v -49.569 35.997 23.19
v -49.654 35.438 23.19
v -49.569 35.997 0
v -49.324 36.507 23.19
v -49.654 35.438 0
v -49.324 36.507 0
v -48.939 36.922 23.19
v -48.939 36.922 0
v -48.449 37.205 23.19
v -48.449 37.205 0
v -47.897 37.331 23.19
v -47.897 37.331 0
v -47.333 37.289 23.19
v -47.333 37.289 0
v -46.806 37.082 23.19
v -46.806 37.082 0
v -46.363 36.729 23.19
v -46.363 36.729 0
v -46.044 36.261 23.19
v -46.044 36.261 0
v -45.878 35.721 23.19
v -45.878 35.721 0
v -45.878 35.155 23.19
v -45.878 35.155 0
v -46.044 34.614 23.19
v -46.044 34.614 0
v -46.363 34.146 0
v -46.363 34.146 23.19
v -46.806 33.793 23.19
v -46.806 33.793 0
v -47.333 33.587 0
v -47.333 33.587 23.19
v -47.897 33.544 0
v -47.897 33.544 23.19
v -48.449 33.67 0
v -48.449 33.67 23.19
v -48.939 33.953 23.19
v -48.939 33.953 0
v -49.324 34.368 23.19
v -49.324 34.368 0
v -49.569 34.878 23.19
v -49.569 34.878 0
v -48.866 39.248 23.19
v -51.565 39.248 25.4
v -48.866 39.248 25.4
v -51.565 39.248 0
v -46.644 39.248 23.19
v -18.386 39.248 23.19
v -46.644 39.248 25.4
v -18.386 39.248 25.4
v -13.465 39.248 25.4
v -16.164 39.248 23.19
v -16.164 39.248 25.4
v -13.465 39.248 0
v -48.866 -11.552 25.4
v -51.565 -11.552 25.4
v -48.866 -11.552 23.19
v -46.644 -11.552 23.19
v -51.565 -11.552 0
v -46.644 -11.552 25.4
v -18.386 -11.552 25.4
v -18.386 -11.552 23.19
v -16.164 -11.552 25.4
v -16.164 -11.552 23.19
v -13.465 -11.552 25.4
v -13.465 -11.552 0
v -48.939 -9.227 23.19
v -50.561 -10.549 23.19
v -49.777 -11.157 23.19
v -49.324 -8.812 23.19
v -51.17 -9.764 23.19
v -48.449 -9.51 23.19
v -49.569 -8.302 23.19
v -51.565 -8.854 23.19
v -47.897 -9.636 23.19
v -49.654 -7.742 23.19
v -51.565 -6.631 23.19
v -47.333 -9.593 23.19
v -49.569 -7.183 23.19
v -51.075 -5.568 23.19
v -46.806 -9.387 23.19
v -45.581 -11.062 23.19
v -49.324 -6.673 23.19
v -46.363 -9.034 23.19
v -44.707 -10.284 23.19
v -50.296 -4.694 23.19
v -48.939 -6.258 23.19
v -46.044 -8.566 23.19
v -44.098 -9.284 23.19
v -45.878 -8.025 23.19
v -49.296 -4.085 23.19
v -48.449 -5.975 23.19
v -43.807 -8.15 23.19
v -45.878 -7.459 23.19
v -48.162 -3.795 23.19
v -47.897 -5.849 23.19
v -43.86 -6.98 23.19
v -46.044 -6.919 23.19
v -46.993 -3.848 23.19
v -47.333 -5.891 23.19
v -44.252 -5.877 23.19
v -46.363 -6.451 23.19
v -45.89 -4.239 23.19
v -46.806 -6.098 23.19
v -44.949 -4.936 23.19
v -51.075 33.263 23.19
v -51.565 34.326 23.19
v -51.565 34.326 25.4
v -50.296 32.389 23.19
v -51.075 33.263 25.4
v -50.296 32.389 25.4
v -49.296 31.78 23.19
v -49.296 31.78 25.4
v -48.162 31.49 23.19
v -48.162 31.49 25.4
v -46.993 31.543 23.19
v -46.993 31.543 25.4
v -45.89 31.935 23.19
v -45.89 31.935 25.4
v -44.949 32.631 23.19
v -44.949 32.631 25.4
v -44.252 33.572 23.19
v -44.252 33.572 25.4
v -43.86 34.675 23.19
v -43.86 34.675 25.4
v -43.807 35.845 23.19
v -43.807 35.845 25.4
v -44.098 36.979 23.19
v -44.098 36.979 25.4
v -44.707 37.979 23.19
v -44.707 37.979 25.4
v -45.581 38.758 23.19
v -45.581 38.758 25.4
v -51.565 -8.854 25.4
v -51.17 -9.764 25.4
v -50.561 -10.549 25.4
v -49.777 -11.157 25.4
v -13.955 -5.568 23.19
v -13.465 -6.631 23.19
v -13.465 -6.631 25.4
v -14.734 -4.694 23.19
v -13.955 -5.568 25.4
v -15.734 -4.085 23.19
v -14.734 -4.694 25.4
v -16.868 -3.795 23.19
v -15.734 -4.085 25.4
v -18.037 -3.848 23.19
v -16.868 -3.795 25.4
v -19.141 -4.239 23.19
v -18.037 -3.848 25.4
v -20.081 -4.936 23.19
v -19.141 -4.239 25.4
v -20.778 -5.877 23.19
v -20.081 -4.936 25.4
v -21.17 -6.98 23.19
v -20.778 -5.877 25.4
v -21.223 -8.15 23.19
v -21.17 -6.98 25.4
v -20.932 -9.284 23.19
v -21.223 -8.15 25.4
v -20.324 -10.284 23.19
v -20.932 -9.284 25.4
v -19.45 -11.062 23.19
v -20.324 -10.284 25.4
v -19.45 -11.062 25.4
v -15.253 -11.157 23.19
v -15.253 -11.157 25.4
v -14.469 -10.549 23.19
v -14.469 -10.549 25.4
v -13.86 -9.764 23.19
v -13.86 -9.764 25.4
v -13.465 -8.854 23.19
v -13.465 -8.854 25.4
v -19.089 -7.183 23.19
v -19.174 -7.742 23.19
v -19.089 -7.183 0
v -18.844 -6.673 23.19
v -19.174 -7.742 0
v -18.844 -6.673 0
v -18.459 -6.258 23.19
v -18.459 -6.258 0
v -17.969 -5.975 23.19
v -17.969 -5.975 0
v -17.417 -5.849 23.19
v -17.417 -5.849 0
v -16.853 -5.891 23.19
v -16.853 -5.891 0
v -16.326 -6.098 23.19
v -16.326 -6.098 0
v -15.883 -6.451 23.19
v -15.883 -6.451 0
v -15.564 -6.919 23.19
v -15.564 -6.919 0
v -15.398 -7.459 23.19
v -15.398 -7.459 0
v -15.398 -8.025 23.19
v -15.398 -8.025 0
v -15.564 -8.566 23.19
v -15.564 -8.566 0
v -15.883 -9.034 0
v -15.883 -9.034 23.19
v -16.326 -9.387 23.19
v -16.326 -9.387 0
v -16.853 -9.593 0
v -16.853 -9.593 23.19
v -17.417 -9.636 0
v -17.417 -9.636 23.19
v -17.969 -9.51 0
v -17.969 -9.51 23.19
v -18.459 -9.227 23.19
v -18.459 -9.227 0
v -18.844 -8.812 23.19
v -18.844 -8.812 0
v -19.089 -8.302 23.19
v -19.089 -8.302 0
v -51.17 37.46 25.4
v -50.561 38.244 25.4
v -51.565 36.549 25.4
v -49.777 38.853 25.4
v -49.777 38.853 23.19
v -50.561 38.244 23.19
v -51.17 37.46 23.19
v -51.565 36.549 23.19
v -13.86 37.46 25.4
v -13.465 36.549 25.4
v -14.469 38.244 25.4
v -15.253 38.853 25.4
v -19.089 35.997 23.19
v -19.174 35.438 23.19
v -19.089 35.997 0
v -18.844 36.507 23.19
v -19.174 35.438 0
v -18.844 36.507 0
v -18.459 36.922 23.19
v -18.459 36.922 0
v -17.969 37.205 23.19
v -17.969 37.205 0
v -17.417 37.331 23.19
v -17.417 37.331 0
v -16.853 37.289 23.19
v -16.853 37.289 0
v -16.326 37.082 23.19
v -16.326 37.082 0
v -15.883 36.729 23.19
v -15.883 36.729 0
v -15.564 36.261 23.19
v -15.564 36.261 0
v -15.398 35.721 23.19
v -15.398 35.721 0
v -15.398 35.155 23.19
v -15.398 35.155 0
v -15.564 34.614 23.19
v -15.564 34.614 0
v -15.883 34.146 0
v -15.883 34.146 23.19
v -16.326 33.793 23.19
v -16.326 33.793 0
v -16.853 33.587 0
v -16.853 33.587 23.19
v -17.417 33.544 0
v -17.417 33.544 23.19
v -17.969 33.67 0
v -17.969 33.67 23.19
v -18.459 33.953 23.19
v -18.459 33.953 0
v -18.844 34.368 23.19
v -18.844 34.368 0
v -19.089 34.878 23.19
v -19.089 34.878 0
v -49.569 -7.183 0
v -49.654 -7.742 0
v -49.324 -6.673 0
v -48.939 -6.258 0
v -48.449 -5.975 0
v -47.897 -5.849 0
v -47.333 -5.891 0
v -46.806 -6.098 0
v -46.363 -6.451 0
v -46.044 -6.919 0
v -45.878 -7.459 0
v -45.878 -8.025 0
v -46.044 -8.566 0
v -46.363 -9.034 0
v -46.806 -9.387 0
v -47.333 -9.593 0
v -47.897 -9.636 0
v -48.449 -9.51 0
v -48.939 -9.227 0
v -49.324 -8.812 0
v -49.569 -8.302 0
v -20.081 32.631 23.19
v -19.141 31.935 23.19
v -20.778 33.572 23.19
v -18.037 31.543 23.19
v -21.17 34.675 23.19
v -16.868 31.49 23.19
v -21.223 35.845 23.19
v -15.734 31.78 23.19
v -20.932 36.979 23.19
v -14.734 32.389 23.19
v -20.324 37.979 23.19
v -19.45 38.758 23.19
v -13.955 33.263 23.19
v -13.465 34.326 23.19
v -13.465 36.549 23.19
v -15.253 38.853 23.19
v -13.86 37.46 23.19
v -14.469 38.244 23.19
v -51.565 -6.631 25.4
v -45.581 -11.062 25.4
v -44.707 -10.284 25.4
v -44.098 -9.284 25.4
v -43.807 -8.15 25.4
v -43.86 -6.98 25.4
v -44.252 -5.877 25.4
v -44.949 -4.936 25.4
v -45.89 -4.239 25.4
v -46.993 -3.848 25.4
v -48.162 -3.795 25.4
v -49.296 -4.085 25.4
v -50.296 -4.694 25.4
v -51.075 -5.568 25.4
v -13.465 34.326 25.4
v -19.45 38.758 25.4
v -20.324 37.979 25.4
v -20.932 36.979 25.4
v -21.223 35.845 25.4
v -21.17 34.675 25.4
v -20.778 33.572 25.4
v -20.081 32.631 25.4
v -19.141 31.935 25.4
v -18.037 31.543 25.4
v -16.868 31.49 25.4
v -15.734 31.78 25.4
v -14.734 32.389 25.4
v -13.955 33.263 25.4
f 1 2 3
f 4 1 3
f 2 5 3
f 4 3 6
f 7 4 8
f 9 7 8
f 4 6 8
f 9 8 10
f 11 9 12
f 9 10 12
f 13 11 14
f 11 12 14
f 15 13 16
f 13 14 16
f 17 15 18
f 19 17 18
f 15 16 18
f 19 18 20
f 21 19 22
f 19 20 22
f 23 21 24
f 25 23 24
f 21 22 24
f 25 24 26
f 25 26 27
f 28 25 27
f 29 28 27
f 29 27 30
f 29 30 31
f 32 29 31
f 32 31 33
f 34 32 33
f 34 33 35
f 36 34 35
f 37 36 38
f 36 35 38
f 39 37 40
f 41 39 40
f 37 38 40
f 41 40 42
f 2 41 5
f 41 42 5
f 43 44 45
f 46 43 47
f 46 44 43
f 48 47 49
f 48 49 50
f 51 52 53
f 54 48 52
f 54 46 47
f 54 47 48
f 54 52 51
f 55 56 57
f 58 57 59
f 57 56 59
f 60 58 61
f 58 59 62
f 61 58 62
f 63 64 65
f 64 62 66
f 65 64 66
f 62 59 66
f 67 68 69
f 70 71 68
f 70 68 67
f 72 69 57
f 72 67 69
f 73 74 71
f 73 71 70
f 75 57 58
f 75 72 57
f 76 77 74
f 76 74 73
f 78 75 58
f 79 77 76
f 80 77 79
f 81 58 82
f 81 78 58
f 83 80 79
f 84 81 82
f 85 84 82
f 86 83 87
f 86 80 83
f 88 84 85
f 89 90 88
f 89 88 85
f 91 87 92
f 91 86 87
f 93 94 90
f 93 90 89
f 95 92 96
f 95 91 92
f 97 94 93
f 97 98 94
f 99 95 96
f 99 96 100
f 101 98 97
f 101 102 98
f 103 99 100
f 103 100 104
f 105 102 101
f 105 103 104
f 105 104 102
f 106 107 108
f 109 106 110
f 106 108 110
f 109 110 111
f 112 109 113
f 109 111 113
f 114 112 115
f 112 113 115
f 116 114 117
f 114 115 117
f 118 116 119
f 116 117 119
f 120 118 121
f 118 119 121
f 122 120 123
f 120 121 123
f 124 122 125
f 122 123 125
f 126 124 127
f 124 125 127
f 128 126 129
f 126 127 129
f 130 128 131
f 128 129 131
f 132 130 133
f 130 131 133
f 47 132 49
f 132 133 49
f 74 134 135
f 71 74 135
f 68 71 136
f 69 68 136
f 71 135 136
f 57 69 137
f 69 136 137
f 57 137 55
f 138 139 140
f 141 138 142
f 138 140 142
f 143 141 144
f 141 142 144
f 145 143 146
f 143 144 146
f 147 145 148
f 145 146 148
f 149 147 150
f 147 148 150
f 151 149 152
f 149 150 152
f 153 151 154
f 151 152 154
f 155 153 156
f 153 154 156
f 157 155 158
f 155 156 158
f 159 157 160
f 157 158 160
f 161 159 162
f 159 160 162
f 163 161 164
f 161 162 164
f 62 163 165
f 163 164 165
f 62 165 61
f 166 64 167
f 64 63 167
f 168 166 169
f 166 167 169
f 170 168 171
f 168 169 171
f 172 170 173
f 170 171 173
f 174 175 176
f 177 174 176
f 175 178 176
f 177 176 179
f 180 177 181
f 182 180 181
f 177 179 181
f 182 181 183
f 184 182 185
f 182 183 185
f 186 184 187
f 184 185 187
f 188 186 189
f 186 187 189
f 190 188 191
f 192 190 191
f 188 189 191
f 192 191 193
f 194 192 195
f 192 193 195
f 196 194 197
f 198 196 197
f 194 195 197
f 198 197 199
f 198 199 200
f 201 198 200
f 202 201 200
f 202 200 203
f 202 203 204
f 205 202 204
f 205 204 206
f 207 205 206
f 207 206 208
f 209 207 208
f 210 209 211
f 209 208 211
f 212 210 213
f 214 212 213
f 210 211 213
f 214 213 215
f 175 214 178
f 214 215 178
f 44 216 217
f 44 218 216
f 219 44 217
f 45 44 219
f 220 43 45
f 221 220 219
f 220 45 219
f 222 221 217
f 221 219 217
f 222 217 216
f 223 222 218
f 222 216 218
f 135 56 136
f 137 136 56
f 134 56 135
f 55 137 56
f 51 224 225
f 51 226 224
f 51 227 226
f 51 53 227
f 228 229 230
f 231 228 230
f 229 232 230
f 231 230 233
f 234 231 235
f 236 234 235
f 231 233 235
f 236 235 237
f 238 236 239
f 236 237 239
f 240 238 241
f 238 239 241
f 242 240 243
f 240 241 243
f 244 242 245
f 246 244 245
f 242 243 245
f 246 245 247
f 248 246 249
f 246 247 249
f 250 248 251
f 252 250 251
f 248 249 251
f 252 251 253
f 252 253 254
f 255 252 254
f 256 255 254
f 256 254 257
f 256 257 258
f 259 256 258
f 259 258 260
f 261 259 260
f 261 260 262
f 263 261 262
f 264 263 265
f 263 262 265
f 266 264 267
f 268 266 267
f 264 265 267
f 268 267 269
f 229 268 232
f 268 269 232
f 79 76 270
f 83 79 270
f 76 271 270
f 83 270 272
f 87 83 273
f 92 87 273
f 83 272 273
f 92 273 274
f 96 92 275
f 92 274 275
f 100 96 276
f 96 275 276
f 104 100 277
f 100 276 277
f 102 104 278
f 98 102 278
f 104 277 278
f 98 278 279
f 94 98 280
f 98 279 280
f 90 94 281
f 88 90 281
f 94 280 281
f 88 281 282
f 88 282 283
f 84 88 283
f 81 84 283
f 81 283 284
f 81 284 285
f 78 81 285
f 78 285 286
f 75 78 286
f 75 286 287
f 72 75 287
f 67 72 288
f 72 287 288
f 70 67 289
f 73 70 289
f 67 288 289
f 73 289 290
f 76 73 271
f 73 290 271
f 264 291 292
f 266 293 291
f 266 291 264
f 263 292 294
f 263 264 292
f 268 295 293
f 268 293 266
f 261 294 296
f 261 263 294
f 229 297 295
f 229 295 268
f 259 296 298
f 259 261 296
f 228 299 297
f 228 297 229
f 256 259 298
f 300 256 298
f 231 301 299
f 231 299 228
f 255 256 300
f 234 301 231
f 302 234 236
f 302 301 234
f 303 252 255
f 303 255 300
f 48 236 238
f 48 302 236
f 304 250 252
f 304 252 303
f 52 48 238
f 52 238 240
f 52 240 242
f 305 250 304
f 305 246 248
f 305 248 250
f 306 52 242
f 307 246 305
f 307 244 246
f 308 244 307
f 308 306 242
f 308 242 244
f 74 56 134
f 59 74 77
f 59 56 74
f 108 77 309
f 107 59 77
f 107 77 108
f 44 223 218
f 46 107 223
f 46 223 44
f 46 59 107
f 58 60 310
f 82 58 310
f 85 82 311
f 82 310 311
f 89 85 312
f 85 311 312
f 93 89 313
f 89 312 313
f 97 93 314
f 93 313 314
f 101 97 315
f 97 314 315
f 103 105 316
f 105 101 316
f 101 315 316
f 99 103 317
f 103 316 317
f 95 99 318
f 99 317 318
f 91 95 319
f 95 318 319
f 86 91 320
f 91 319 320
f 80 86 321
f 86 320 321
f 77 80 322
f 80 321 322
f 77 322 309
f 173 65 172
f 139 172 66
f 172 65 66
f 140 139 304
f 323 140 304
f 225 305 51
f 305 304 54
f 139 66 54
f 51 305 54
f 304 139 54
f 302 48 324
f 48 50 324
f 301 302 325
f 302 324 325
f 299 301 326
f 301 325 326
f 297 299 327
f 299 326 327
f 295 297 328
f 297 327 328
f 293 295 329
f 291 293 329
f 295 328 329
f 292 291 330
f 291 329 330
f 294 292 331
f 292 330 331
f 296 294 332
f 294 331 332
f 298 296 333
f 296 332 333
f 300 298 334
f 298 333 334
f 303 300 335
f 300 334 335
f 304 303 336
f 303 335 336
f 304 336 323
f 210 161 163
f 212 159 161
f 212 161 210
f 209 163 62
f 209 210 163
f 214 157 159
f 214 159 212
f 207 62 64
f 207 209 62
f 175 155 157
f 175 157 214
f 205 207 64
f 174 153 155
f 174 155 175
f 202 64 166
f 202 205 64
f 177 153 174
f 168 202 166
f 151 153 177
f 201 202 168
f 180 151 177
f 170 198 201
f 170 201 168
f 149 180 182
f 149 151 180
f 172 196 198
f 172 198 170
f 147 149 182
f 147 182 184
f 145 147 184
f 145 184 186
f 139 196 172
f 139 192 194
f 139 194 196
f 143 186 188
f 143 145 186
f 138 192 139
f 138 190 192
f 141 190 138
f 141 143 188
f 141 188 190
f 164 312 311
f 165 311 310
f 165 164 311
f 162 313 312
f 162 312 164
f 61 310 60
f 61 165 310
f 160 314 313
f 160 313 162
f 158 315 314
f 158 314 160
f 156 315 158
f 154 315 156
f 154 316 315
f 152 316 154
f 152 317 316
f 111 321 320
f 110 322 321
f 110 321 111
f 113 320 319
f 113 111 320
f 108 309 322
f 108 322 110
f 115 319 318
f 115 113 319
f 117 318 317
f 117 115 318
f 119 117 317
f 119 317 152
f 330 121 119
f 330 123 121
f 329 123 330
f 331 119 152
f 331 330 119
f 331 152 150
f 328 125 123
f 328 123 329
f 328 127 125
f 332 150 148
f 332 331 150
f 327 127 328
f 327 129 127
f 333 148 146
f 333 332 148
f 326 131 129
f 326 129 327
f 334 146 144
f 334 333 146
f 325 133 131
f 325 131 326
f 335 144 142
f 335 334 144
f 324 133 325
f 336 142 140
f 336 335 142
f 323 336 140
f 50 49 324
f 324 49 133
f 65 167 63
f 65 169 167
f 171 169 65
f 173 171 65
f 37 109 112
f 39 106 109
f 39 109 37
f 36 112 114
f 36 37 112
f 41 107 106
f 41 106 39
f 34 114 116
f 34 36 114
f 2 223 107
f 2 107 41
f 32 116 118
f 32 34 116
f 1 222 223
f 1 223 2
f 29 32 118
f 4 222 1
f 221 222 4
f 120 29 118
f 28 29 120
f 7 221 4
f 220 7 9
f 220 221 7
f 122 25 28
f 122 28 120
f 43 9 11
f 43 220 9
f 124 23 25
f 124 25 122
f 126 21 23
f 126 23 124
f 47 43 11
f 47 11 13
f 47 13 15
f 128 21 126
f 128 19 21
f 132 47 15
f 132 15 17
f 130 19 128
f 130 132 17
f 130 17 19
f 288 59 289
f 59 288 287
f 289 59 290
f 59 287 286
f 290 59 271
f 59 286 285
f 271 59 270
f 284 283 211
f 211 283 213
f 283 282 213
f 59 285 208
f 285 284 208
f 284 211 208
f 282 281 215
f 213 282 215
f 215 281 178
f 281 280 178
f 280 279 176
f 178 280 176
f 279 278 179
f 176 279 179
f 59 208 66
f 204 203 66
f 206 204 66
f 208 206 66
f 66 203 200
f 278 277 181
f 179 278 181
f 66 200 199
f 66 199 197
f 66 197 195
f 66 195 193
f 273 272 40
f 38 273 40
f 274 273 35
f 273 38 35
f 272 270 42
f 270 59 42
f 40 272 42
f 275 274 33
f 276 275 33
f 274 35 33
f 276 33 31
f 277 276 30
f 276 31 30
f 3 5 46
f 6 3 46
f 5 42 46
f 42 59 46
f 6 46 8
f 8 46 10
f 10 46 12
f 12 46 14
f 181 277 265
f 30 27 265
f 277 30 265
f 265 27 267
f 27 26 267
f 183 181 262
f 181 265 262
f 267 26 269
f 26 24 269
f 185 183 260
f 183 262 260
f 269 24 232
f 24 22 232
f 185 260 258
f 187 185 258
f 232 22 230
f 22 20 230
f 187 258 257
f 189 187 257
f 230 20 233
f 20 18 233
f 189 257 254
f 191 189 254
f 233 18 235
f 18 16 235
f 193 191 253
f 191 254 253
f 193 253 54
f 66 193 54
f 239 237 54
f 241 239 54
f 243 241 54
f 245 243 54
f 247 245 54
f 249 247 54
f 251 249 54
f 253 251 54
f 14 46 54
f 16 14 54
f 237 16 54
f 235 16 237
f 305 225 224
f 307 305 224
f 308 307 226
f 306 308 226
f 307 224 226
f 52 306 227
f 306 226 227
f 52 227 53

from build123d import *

# Parameters (mm, degrees)
SKETCH2_W                                           = 38.1
SKETCH2_H                                           = 50.8
BOSS_EXTRUDE1_DEPTH                                 = 25.4
CBORE_FOR_6_BINDING_HEAD_MACHINE_SCREW1_D           = 3.7973
CBORE_FOR_6_BINDING_HEAD_MACHINE_SCREW1_CBORE_D     = 7.9375
CBORE_FOR_6_BINDING_HEAD_MACHINE_SCREW1_CBORE_DEPTH = 2.2098


with BuildPart() as part:
    # Sketch2 → Boss-Extrude1 (new body)
    with BuildSketch(Plane.XY):
        with Locations((-32.515060241, 13.847590361)):
            Rectangle(SKETCH2_W, SKETCH2_H)
    extrude(amount=BOSS_EXTRUDE1_DEPTH)

    # CBORE for #6 Binding Head Machine Screw1 (through all)
    with Locations(Plane(origin=(-47.755060241, 35.437590361, 25.4), x_dir=(1, 0, 0), z_dir=(0, 0, 1))):
        with Locations((0, 0), (30.48, 0), (0, -43.18), (30.48, -43.18)):
            CounterBoreHole(CBORE_FOR_6_BINDING_HEAD_MACHINE_SCREW1_D / 2, CBORE_FOR_6_BINDING_HEAD_MACHINE_SCREW1_CBORE_D / 2, CBORE_FOR_6_BINDING_HEAD_MACHINE_SCREW1_CBORE_DEPTH)


solid = part.part
